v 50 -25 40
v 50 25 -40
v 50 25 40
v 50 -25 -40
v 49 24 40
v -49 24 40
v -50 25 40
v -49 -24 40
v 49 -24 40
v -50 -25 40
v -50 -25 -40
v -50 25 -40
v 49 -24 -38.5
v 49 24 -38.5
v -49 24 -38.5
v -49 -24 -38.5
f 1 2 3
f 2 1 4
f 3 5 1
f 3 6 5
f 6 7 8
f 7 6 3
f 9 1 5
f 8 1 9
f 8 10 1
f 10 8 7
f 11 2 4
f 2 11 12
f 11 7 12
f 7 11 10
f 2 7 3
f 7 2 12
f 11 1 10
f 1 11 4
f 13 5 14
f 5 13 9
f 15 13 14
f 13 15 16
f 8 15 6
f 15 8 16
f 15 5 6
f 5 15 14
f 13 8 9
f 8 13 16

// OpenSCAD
lenght=100;//[20:5:200]
width=50;//[20:5:200]
hight=80;//[20:5:200]
thikness=1;//[0.1:0.1:3]
bottom=1;//[0.1:0.1:3]

difference(){
cube([lenght,width,hight],center=true);
translate(v=[0,0,bottom])
cube([lenght-thikness*2,width-thikness*2,hight-bottom],center=true);}
